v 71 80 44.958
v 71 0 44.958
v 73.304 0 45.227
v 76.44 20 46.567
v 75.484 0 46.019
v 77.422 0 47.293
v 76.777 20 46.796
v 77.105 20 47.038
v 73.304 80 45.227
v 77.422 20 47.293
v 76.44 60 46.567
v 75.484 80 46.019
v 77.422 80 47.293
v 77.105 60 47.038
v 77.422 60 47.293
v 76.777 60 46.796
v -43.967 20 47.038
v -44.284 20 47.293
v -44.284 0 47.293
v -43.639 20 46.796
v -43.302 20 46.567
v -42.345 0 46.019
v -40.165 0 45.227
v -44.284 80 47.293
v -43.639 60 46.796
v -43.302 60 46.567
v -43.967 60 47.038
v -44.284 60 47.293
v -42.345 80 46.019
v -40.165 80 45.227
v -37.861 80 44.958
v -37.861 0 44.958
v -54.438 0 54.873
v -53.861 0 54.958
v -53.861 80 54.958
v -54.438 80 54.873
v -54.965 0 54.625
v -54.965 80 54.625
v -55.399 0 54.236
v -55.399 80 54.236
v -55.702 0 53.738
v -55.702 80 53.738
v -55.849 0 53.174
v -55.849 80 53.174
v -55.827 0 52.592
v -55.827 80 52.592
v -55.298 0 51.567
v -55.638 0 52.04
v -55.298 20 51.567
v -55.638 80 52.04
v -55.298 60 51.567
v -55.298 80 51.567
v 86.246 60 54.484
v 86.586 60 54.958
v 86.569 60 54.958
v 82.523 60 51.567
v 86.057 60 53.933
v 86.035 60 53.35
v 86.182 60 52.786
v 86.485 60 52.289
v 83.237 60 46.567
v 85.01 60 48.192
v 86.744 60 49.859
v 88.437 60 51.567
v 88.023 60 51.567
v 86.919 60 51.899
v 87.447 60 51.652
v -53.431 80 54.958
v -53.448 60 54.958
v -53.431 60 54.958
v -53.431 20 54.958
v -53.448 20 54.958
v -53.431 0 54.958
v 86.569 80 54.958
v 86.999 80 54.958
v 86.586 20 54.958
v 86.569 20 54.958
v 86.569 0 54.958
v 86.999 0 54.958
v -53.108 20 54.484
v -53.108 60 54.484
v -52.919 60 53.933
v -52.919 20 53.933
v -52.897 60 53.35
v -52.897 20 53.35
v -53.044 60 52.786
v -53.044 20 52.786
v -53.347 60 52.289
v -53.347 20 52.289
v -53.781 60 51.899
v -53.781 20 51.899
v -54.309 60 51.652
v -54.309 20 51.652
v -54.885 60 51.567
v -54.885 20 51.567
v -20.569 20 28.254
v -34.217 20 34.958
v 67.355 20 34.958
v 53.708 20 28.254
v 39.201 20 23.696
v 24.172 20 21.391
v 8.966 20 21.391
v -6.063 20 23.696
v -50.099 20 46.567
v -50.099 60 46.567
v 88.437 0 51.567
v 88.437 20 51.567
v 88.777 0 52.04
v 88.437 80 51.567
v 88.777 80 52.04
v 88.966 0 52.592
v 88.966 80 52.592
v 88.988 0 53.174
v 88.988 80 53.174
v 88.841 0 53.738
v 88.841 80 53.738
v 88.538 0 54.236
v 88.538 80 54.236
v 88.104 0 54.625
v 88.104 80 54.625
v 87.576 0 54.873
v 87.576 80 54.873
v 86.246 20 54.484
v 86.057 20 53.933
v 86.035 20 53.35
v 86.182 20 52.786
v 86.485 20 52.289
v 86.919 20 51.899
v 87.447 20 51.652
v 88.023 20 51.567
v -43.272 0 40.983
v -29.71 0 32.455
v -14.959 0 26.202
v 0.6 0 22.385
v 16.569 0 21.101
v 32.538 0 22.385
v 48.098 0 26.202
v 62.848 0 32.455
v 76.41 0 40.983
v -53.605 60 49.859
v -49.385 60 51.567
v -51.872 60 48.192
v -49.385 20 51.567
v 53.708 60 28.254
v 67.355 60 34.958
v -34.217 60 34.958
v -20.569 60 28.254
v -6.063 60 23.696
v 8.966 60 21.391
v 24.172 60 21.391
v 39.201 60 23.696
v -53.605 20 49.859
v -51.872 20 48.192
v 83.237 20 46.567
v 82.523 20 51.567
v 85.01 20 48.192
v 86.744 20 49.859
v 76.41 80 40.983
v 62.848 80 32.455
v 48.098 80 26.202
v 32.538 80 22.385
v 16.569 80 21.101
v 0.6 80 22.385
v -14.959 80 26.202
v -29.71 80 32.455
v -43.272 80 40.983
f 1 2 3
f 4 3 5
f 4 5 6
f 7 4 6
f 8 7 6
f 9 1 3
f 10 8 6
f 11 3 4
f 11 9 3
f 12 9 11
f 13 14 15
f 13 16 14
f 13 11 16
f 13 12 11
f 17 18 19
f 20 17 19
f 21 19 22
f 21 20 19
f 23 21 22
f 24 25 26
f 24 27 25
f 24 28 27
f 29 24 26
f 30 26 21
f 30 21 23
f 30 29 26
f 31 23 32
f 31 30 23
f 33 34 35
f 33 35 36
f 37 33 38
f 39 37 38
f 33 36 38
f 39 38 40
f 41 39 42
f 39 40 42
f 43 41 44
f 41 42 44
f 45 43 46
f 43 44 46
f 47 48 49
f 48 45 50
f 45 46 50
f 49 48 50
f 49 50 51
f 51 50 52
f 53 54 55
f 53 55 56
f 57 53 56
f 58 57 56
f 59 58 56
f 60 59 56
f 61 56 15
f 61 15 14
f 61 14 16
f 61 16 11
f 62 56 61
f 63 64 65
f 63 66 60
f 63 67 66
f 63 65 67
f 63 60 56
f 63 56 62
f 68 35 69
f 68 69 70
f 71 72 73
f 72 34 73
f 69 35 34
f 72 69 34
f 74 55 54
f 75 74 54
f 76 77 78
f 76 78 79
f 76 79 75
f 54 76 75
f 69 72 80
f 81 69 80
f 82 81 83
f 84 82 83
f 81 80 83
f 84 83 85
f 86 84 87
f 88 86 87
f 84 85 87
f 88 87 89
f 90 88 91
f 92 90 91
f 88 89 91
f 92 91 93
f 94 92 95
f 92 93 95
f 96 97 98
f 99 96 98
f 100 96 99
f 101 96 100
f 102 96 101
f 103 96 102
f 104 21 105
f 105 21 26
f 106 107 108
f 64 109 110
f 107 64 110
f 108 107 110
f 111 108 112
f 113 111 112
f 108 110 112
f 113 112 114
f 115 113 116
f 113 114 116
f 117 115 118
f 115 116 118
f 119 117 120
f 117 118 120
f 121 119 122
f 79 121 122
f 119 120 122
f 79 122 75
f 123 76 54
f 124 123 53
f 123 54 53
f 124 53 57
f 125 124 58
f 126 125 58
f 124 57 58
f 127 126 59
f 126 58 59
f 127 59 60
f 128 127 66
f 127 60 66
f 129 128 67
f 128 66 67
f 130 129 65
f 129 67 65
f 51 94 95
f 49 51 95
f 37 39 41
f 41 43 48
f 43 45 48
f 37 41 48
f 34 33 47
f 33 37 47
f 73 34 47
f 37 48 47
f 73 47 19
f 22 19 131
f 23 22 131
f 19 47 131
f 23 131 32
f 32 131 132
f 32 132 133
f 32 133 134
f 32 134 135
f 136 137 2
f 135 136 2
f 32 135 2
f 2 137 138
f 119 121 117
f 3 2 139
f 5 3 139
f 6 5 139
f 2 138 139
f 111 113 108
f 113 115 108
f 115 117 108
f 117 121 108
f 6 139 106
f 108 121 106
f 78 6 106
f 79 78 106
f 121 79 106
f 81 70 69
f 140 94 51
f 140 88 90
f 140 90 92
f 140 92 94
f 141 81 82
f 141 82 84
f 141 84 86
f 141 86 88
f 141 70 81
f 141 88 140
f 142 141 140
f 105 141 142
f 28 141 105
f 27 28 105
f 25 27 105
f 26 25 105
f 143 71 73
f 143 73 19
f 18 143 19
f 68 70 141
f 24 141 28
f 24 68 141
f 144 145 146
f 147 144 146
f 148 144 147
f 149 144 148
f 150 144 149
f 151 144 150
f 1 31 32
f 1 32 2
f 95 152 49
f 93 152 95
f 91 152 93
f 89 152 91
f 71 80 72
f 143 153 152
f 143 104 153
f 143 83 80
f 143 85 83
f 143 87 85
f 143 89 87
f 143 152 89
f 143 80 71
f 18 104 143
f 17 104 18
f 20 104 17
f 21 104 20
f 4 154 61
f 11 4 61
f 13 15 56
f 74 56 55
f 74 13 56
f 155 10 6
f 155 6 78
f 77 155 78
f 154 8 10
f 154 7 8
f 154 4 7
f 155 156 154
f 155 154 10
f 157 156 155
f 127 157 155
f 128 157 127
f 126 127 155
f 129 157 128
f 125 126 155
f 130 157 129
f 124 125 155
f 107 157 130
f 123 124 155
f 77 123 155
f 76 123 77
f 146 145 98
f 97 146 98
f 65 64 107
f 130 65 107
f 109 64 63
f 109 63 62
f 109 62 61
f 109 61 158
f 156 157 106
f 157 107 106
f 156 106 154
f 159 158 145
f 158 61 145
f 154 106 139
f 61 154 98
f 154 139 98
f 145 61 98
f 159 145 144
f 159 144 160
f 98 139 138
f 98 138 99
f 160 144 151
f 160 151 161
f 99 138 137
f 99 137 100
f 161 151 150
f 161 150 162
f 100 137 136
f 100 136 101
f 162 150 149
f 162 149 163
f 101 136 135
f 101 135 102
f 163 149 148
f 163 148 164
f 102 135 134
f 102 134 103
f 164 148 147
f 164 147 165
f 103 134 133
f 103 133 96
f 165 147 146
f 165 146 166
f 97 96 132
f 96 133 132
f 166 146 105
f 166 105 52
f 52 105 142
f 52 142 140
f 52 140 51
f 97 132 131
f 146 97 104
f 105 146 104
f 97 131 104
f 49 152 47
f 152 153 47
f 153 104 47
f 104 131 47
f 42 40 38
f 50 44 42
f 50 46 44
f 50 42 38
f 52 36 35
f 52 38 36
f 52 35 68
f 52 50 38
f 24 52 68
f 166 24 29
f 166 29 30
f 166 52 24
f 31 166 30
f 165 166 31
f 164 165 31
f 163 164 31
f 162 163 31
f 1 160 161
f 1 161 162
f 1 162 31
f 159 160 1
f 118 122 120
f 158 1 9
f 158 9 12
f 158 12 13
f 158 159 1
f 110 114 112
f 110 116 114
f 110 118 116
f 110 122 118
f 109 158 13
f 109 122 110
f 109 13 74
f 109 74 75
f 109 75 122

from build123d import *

# Parameters (mm, degrees)
EXTRUDE_4_DEPTH     = 80
CUT_EXTRUDE_1_DEPTH = 80
FILLET_3_R          = 2
FILLET_4_R          = 2
CUT_EXTRUDE_2_DEPTH = 90
CUT_EXTRUDE_3_DEPTH = 90
FILLET_5_R          = 2
FILLET_6_R          = 2


with BuildPart() as part:
    # 草图1 → 凸台-拉伸4 (new body)
    with BuildSketch(Plane(origin=(0, 0, 0), x_dir=(1, 0, 0), z_dir=(0, 1, 0))):
        with BuildLine():
            Line((-58.430824656, -54.95766375), (91.569175344, -54.95766375))
            ThreePointArc((91.569175344, -54.95766375), (16.569175344, -21.101446527), (-58.430824656, -54.95766375))
        make_face()
    extrude(amount=EXTRUDE_4_DEPTH)

    # 草图6 → 切除-拉伸1 (cut)
    with BuildSketch(Plane(origin=(0, 80, 0), x_dir=(1, 0, 0), z_dir=(0, 1, 0))):
        with BuildLine():
            Line((16.569175344, -54.95766375), (-53.430824656, -54.95766375))
            Line((-53.430824656, -54.95766375), (-44.284141383, -47.292975133))
            ThreePointArc((-44.284141383, -47.292975133), (-41.278424436, -45.559608468), (-37.861326704, -44.95766375))
            Line((-37.861326704, -44.95766375), (16.569175344, -44.95766375))
            Line((16.569175344, -44.95766375), (70.999677391, -44.95766375))
            ThreePointArc((70.999677391, -44.95766375), (74.416775124, -45.559608468), (77.422492071, -47.292975133))
            Line((77.422492071, -47.292975133), (86.569175344, -54.95766375))
            Line((86.569175344, -54.95766375), (16.569175344, -54.95766375))
        make_face()
    extrude(amount=-CUT_EXTRUDE_1_DEPTH, mode=Mode.SUBTRACT)

    # 圆角3
    fillet_3_edges = [part.edges().sort_by_distance(p)[0] for p in [
        (-58.430824656, 40, 54.95766375),
    ]]
    fillet(fillet_3_edges, radius=FILLET_3_R)

    # 圆角4
    fillet_4_edges = [part.edges().sort_by_distance(p)[0] for p in [
        (91.569175344, 40, 54.95766375),
    ]]
    fillet(fillet_4_edges, radius=FILLET_4_R)

    # 草图7 → 切除-拉伸2 (cut, symmetric)
    with BuildSketch(Plane(origin=(0, 0, 0), x_dir=(0, 0, -1), z_dir=(1, 0, 0))):
        Polygon((-34.95766375, 20), (-21.101446527, 20), (-21.101446527, 60), (-34.95766375, 60), (-34.95766375, 40), align=None)
    extrude(amount=CUT_EXTRUDE_2_DEPTH, both=True, mode=Mode.SUBTRACT)

    # 草图8 → 切除-拉伸3 (cut, symmetric)
    with BuildSketch(Plane(origin=(0, 0, 0), x_dir=(0, 0, -1), z_dir=(1, 0, 0))):
        Polygon((-46.566974306, 40), (-46.566974306, 20), (-51.566974306, 20), (-51.566974306, 40), (-51.566974306, 60), (-46.566974306, 60), align=None)
    extrude(amount=CUT_EXTRUDE_3_DEPTH, both=True, mode=Mode.SUBTRACT)

    # 圆角5
    # the kernel refuses this fillet: 2 mm, written as the material it takes off along each edge
    with BuildSketch(Plane(origin=(-49.384533414, 20, 51.566974306), x_dir=(-0.7664688616948695, 0, 0.6422814679345583), z_dir=(0, 1, 0))) as fillet_5_piece_1:
        with BuildLine():
            CenterArc((FILLET_5_R * 2.75030333255, -FILLET_5_R), FILLET_5_R, 90, 140.037846047)
            Line((FILLET_5_R * 2.10802186461, -FILLET_5_R * 1.76646886169), (0, 0))
            Line((0, 0), (FILLET_5_R * 2.75030333255, 0))
        make_face()
    extrude(amount=40, mode=Mode.SUBTRACT)

    # 圆角6
    # the kernel refuses this fillet: 2 mm, written as the material it takes off along each edge
    with BuildSketch(Plane(origin=(82.522884101, 60, 51.566974306), x_dir=(1, 0, 0), z_dir=(0, -1, 0))) as fillet_6_piece_1:
        with BuildLine():
            CenterArc((FILLET_6_R * 2.75030333255, FILLET_6_R), FILLET_6_R, 129.962153953, 140.037846047)
            Line((FILLET_6_R * 2.10802186461, FILLET_6_R * 1.76646886169), (0, 0))
            Line((0, 0), (FILLET_6_R * 2.75030333255, 0))
        make_face()
    extrude(amount=40, mode=Mode.SUBTRACT)


solid = part.part
